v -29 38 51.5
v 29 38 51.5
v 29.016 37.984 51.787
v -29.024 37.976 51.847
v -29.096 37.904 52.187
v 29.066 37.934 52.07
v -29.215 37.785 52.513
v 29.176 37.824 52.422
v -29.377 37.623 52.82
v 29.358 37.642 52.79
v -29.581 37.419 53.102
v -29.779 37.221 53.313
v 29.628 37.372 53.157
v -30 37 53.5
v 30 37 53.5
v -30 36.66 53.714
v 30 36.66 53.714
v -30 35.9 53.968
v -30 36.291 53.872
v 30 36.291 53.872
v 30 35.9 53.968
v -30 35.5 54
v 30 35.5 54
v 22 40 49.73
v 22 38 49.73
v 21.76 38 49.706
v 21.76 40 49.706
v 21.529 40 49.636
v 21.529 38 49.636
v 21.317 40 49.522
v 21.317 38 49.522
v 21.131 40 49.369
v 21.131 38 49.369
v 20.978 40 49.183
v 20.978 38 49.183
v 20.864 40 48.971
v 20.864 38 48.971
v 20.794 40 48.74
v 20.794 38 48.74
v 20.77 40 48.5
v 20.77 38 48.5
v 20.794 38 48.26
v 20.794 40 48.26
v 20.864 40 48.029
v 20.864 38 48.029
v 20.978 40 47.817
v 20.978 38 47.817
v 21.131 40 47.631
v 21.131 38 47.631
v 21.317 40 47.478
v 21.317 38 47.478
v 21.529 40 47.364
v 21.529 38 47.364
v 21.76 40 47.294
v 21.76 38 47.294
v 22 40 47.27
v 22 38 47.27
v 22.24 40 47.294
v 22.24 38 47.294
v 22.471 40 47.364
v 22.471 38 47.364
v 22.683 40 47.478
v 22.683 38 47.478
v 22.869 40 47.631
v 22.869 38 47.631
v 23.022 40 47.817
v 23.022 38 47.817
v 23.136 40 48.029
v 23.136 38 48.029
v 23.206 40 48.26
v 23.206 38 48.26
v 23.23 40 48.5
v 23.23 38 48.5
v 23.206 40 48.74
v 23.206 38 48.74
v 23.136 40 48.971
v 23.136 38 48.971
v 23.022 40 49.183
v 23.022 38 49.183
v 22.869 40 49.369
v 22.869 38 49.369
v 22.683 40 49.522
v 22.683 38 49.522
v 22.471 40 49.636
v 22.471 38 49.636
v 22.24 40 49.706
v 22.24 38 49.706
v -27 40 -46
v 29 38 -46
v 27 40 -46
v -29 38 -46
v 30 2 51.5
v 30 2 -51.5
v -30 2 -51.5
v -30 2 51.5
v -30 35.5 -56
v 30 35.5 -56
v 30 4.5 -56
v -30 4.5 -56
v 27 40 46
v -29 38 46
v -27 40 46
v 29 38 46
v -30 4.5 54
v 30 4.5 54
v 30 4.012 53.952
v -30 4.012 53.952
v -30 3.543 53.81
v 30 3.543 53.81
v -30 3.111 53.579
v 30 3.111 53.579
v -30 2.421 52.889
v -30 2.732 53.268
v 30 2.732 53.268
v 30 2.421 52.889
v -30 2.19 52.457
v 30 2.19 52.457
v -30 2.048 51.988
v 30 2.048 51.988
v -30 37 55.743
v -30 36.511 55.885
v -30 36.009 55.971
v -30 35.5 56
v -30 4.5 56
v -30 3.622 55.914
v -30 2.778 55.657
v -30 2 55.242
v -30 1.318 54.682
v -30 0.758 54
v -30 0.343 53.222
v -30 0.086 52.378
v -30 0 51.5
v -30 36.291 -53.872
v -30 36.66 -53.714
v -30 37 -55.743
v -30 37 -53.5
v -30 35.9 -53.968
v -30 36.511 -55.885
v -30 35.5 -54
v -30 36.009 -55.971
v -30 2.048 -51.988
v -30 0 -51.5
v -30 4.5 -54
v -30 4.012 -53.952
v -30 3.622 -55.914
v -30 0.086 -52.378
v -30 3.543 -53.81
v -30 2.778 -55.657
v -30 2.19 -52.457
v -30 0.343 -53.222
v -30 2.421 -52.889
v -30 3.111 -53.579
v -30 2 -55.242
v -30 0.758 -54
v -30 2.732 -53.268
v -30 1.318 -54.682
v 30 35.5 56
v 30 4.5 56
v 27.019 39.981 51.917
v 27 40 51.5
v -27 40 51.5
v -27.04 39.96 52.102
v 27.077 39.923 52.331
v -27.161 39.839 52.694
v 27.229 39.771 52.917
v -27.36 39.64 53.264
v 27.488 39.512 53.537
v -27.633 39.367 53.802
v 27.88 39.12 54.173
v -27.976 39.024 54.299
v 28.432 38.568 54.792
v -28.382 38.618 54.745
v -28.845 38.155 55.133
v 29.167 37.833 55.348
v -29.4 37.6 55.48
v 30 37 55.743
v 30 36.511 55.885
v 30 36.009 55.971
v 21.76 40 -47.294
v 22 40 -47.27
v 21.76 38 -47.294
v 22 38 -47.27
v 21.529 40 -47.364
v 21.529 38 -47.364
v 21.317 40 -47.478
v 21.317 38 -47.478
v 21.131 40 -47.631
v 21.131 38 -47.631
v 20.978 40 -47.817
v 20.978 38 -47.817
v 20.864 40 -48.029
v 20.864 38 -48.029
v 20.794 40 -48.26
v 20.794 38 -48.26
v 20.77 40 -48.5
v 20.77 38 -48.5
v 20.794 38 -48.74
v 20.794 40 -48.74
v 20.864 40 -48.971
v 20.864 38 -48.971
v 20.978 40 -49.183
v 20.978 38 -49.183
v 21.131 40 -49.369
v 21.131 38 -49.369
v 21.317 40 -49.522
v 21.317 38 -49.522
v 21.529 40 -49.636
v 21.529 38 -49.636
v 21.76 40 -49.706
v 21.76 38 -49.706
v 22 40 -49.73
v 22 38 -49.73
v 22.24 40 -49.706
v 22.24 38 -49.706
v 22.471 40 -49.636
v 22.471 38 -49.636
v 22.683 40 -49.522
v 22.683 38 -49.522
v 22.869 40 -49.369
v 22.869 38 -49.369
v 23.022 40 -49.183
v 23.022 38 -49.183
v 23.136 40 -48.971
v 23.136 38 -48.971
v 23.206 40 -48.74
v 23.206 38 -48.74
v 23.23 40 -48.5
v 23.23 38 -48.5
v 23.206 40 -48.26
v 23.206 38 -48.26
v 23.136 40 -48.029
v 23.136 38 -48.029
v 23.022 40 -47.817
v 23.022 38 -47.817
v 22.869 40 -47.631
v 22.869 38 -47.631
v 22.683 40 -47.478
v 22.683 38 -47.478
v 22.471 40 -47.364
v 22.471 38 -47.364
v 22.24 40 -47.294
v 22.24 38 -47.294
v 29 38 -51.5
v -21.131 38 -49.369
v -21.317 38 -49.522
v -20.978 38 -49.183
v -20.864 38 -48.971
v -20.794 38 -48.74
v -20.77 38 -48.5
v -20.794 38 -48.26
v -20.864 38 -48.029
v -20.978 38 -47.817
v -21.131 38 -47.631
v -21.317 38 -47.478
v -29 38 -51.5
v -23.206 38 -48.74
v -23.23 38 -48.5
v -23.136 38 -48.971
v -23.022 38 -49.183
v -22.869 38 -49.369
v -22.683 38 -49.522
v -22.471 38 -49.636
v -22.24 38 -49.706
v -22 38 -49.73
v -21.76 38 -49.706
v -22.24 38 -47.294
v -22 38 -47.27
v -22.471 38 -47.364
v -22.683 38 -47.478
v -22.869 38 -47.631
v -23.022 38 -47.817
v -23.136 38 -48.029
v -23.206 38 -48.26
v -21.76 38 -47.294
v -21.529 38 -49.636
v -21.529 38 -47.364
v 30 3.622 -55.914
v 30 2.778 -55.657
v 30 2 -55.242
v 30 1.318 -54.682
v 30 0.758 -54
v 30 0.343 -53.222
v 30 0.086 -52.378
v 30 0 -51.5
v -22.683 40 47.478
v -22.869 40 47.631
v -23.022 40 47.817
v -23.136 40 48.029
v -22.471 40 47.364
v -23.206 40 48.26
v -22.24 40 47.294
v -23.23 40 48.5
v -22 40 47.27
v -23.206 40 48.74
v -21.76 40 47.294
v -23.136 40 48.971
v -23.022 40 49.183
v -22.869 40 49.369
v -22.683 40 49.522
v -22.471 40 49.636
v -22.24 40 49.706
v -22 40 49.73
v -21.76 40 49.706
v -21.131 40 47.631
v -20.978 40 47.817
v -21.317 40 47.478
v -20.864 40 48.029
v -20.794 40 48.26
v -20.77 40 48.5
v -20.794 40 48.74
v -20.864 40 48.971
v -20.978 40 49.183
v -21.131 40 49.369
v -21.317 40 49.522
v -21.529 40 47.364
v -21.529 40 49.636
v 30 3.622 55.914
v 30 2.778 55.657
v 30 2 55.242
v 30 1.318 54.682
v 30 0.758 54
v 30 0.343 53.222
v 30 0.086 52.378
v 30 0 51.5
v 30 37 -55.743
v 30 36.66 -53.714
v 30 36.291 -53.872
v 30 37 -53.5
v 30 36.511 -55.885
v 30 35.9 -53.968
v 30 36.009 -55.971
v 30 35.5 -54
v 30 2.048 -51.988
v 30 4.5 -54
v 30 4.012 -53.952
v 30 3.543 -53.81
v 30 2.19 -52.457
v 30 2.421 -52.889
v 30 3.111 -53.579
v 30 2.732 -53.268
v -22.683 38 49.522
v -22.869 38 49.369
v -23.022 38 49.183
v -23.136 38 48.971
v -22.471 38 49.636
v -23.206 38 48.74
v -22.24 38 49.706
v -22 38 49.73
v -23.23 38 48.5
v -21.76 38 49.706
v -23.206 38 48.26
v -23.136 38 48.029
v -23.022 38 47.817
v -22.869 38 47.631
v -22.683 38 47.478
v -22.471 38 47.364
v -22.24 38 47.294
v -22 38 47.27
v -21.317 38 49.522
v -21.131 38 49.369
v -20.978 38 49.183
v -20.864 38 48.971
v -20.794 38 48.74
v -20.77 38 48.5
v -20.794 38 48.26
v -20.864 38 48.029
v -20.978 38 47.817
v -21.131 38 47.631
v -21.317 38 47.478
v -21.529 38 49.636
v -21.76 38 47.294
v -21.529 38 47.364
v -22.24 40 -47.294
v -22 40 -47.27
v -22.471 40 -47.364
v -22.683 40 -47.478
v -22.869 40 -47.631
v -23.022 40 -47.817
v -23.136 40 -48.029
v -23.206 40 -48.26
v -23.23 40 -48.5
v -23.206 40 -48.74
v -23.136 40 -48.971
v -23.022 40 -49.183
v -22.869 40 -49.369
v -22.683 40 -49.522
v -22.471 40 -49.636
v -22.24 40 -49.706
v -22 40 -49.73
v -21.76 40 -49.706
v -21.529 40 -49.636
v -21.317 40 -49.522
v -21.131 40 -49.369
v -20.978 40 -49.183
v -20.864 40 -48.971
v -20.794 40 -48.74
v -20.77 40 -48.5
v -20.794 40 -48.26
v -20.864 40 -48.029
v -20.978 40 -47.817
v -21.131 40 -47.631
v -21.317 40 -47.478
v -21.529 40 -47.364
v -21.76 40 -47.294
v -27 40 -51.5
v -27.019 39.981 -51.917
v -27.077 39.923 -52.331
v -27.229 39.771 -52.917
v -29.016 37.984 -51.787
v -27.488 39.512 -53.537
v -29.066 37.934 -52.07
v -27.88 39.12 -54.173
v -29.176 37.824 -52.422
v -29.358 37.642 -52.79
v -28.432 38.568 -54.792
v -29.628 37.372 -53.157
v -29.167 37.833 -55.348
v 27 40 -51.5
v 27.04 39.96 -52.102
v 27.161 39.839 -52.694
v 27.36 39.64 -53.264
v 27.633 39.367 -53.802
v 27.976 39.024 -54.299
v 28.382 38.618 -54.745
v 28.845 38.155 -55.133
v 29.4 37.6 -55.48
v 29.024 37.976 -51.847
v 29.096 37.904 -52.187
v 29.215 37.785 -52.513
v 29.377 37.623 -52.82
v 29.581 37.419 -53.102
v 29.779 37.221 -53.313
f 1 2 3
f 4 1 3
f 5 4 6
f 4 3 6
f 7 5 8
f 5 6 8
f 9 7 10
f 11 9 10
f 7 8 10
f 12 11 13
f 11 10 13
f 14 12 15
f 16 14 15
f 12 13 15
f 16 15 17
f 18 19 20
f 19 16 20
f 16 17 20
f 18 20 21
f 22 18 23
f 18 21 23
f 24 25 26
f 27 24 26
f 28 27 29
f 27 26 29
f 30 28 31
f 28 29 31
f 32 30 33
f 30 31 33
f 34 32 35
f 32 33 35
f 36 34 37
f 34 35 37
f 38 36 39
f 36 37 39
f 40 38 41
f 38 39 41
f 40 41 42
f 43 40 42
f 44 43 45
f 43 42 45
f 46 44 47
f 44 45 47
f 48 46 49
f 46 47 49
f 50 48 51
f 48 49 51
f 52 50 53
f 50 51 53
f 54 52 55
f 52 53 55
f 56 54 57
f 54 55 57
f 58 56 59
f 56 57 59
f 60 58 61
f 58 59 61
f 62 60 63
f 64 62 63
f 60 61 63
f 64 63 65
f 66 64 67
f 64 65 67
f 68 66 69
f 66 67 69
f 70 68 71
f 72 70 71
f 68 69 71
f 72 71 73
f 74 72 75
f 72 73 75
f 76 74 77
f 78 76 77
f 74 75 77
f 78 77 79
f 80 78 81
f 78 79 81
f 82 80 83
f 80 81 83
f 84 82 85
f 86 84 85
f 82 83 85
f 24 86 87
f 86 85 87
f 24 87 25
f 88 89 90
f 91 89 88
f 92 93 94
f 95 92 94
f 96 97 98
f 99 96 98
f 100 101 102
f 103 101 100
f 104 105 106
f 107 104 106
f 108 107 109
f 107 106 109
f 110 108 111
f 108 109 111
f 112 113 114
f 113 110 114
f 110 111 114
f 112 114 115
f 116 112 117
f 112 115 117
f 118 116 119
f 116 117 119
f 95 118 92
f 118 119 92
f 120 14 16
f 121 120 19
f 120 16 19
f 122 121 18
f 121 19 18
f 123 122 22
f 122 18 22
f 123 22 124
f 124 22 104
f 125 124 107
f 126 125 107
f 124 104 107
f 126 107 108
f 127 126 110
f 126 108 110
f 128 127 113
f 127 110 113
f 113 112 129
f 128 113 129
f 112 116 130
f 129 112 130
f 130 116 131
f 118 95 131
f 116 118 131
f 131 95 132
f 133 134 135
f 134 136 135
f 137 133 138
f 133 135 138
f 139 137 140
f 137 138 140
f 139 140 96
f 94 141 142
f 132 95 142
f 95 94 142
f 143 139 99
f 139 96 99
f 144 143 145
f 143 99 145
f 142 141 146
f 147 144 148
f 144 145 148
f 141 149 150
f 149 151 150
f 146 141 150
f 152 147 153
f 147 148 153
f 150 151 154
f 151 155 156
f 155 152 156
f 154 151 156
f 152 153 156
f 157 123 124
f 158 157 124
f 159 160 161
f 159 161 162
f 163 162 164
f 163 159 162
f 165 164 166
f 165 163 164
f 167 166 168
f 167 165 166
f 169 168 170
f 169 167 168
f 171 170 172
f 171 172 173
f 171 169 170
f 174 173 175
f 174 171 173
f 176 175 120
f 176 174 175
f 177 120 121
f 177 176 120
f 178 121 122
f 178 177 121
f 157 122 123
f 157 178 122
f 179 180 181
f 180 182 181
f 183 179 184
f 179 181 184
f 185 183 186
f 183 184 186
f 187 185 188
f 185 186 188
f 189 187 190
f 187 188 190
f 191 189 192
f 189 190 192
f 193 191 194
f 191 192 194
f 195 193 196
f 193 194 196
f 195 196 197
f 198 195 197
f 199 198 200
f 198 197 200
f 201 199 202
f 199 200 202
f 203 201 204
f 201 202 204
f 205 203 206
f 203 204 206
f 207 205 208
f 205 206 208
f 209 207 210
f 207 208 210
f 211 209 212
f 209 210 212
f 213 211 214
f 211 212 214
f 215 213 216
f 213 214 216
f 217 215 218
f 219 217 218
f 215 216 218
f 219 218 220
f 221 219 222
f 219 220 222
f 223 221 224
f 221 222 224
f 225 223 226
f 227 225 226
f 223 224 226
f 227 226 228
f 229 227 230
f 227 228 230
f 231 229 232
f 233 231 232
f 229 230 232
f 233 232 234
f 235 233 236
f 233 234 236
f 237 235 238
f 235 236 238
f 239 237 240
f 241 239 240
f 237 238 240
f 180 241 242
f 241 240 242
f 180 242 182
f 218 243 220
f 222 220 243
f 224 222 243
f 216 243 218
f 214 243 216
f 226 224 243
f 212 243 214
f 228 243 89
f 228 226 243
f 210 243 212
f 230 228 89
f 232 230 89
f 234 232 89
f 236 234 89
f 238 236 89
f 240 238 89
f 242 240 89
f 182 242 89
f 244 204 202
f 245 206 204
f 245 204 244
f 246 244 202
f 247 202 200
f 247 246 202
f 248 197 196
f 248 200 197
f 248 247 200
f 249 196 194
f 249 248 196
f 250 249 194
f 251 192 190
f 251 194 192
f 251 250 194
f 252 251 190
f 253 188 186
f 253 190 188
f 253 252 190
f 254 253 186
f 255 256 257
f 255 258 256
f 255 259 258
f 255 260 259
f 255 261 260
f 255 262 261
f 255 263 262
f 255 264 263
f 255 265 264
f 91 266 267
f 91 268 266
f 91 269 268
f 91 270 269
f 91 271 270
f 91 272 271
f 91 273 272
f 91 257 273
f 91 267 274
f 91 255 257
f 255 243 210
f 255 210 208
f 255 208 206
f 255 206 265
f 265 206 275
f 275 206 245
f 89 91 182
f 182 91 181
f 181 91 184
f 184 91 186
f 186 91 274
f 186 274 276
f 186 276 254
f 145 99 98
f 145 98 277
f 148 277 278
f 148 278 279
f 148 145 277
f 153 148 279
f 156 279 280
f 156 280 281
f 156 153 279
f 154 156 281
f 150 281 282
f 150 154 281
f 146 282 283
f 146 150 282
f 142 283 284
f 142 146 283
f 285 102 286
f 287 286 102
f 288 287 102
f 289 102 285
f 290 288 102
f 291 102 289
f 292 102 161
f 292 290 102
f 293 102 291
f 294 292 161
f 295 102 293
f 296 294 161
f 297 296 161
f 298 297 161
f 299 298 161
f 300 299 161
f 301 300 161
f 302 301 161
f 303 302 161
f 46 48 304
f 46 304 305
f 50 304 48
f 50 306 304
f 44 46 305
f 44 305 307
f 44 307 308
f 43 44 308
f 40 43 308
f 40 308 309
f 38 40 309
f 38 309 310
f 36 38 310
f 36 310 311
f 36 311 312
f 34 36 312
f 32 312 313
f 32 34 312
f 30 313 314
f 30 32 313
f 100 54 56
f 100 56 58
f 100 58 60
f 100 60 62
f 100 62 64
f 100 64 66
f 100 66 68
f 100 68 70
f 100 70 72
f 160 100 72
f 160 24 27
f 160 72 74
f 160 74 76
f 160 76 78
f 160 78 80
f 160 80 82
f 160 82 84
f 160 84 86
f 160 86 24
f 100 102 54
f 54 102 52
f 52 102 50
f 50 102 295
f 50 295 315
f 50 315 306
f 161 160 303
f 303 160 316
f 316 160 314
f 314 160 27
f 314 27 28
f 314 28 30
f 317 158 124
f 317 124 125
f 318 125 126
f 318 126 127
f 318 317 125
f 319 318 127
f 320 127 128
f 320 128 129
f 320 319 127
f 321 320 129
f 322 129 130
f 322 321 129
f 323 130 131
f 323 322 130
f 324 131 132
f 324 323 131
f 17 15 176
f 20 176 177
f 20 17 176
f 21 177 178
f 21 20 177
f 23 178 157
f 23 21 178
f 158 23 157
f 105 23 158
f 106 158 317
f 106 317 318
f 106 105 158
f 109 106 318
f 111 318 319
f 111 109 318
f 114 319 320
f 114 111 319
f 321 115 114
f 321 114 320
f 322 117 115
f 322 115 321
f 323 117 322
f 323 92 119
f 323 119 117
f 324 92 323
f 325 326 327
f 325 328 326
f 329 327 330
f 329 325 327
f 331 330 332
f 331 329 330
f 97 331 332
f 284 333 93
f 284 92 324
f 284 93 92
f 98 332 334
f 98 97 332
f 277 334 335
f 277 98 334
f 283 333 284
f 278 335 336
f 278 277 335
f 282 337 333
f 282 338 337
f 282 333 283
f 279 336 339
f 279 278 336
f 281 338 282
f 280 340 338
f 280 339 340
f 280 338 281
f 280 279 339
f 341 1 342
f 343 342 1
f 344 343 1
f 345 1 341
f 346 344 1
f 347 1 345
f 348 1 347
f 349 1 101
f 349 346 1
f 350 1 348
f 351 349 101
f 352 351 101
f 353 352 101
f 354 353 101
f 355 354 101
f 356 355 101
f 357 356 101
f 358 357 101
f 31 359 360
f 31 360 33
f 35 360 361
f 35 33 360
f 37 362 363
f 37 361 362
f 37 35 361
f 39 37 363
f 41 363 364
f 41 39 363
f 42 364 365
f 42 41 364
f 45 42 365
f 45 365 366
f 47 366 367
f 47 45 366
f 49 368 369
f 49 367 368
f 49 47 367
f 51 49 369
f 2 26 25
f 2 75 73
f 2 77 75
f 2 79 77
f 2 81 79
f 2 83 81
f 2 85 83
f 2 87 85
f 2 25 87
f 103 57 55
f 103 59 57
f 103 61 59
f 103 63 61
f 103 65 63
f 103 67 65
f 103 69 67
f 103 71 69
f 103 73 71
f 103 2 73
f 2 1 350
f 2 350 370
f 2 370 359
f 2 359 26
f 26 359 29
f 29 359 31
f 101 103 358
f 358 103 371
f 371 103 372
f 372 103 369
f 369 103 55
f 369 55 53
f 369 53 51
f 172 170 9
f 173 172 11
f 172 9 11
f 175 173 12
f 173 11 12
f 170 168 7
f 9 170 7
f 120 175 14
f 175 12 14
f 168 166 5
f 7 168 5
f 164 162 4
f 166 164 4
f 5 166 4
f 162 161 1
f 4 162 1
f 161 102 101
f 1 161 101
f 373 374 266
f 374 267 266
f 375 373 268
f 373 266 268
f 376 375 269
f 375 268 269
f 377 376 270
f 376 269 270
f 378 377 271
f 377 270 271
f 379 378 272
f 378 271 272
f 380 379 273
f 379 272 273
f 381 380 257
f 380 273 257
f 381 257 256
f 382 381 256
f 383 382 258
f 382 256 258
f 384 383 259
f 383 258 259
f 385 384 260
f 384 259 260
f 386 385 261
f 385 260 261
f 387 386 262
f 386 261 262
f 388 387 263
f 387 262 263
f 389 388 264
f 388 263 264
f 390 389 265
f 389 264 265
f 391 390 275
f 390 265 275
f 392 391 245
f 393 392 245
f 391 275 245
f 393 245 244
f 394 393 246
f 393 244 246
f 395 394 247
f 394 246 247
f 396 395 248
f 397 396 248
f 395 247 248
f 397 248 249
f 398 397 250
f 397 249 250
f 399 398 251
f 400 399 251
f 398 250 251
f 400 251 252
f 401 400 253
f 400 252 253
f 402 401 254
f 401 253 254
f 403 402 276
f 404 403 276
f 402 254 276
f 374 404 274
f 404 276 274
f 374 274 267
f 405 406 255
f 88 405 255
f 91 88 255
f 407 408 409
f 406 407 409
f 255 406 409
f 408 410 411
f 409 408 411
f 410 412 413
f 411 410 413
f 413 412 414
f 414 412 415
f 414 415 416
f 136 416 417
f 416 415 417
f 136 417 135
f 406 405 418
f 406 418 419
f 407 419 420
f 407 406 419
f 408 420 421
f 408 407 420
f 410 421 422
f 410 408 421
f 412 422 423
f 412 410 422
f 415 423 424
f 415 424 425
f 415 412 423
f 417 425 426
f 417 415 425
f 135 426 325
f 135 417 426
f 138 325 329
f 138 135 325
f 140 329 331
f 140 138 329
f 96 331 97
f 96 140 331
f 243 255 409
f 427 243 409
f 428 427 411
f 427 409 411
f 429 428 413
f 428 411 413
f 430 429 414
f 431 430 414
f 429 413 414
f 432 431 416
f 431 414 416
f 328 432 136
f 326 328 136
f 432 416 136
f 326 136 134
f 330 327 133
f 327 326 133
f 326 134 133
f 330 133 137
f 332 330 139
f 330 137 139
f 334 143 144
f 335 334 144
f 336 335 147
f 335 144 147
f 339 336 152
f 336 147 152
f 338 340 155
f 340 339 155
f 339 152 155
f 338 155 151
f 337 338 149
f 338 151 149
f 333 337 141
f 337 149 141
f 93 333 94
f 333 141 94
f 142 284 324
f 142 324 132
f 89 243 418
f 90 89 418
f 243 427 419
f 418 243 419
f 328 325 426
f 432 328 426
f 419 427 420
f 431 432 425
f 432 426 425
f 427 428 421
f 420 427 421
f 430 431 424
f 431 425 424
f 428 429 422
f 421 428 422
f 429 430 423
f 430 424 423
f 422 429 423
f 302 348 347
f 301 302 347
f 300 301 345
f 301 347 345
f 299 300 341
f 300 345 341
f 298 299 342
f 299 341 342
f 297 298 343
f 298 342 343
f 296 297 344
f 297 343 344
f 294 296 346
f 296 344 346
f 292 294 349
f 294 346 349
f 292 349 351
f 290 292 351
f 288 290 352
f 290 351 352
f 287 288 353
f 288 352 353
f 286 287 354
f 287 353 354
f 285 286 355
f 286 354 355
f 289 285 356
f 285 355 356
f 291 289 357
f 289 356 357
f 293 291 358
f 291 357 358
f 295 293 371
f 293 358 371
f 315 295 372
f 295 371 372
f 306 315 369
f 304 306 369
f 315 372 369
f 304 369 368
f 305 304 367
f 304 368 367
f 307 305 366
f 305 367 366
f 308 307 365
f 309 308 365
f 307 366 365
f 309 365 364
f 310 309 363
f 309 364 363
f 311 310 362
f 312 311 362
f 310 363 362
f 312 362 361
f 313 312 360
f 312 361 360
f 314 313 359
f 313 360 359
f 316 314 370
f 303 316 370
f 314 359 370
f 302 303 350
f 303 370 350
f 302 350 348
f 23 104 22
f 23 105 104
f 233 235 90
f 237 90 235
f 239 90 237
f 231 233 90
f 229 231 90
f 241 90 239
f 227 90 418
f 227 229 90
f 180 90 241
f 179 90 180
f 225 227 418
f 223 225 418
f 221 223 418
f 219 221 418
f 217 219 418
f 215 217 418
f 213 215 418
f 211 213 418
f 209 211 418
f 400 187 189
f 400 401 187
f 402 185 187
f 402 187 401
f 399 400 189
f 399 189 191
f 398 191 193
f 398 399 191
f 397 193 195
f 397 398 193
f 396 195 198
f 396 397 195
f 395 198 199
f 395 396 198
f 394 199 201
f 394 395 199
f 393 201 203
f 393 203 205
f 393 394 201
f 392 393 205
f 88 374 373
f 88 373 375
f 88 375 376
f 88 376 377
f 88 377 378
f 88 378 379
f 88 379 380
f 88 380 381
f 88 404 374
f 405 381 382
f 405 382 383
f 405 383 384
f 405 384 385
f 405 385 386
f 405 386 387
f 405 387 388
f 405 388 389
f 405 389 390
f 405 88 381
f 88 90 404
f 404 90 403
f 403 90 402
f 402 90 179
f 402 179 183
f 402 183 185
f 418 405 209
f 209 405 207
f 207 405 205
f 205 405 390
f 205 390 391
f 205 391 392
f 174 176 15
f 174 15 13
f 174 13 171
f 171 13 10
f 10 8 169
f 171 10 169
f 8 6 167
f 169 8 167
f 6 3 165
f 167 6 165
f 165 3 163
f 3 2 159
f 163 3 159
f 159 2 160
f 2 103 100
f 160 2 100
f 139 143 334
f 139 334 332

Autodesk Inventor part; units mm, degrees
ref_plane "YZ Plane" through (0, 0, 0) normal (1, 0, 0) x (0, 1, 0)
ref_plane "XZ Plane" through (0, 0, 0) normal (0, 1, 0) x (-1, 0, 0)
ref_plane "XY Plane" through (0, 0, 0) normal (0, 0, 1) x (1, 0, 0)
sketch "Szkic1" plane through (0, 0, 0) normal (0, 1, 0) x (-1, 0, 0)
  line L0 (-30, 56) -> (30, 56)
  line L1 (30, 56) -> (30, -56)
  line L2 (30, -56) -> (-30, -56)
  line L3 (-30, -56) -> (-30, 56)
  line L4 (-30, 56) -> (30, -56) construction
  line L5 (30, 56) -> (-30, -56) construction
  point P0 (0, 0)
  dimension "d0" = 60
  dimension "d1" = 112
extrude "Płyta1" add sketch "Szkic1" along normal blind 2
sketch "Szkic2" plane through (30, 0, 54) normal (0, 0, 1) x (1, 0, 0)
  line L0 (-60, 0) -> (0, 0)
  line L1 (0, 0) -> (0, 40)
  line L2 (0, 40) -> (-60, 40)
  line L3 (-60, 40) -> (-60, 0)
edge flange "Kołnierz1" height 40 angle 90 thickness 2 bend radius 2.5 thickness toward (0, 0, 1) relief tear relief width 2 relief depth 1 corner gap 2 corner form 0 edges at (0, 2, 56) (0, 2, -56) wall of the first edge with corners at (-30, 0, 54) (30, 0, 54) (30, 40, 54) (-30, 40, 54)
bend "Zagięcie1"
corner "Narożnik1"
sketch "Szkic3" plane through (30, 38, 56) normal (0, 1, 0) x (-1, 0, 0)
  line L0 (60, 0) -> (0, 0)
  line L1 (0, 0) -> (0, -10)
  line L2 (0, -10) -> (60, -10)
  line L3 (60, -10) -> (60, 0)
edge flange "Kołnierz2" height 10 angle 90 thickness 2 bend radius 2.5 thickness toward (0, 1, 0) relief tear relief width 2 relief depth 1 corner gap 2 corner form 0 edges at (0, 40, 54) (0, 40, -54) wall of the first edge with corners at (-30, 38, 56) (30, 38, 56) (30, 38, 46) (-30, 38, 46)
bend "Zagięcie2"
corner "Narożnik2"
sketch "Szkic4" plane through (-30, 40, 46) normal (0, 1, 0) x (1, 0, 0)
  line L0 (60, 92) -> (0, 92) projected
  line L1 (0, 0) -> (60, 0) projected
  line L2 (0, 92) -> (0, 97.5) projected
  line L3 (60, 97.5) -> (60, 92) projected
  point P0 (30, 46)
  point P1 (8, -2.5)
  point P2 (52, -2.5)
  point P3 (8, 94.5)
  point P4 (52, 94.5)
  dimension "d24" = 2.5
  dimension "d25" = 2.5
  dimension "d26" = 2.5
  dimension "d27" = 2.5
  dimension "d28" = 8
  dimension "d29" = 8
hole "Otwór1" at (-22, 40, 48.5) at (22, 40, 48.5) at (-22, 40, -48.5) at (22, 40, -48.5) direction (0, -1, 0) diameter 2.459 depth 8.8 tip angle 118 thread size "M3x0.5" class "6H" standard "ANSI Metric M Profile"
sketch "Szkic5" plane through (30, 4.5, -56) normal (0, 0, -1) x (-1, 0, 0)
  line L0 (0, 33.5) -> (0, 31) projected
  line L1 (0, 32.5) -> (3, 35.5)
  line L2 (0, 35.5) -> (60, 35.5) projected
  line L3 (0, 35.5) -> (0, 31) projected
  point P0 (30, -4.5)
  dimension "d37" = 45
  dimension "d38" = 3
extrude "Wyciągnięcie proste1" cut sketch "Szkic5" against normal through all
mirror "Odbij1" about plane through (0, 0, 0) normal (1, 0, 0) of "Wyciągnięcie proste1"
equation "\"d2\" = Grubość"
equation "\"d3\" = SzerokośćGięciaPodcięcia"
equation "\"d4\" = GłębokośćGięciaPodcięcia"
equation "\"d5\" = MinimalnaPozostałość"
equation "\"d6\" = PromieńPrzejścia"
equation "\"d10\" = RozmiarPodcięciaNarożnika"
equation "\"d11\" = Wielk_odstępu"
equation "\"d12\" = Rozmiar_promienia_Jacobiego"
equation "\"d14\" = SzerokośćGięciaPodcięcia"
equation "\"d15\" = GłębokośćGięciaPodcięcia"
equation "\"d16\" = MinimalnaPozostałość"
equation "\"d17\" = PromieńPrzejścia"
equation "\"d21\" = RozmiarPodcięciaNarożnika"
equation "\"d22\" = Wielk_odstępu"
equation "\"d23\" = Rozmiar_promienia_Jacobiego"
equation "\"PromieńGięcia\" = Grubość"
equation "\"SzerokośćGięciaPodcięcia\" = Grubość"
equation "\"GłębokośćGięciaPodcięcia\" = 0.5 * Grubość"
equation "\"RozmiarPodcięciaNarożnika\" = 4 * Grubość"
equation "\"MinimalnaPozostałość\" = 2 * Grubość"
equation "\"PromieńPrzejścia\" = PromieńGięcia"
equation "\"Rozmiar_promienia_Jacobiego\" = PromieńGięcia"
equation "\"Wielk_odstępu\" = Grubość"
equation "\"Grubość\" = 2"
properties part number "puszka" material "Stal"
